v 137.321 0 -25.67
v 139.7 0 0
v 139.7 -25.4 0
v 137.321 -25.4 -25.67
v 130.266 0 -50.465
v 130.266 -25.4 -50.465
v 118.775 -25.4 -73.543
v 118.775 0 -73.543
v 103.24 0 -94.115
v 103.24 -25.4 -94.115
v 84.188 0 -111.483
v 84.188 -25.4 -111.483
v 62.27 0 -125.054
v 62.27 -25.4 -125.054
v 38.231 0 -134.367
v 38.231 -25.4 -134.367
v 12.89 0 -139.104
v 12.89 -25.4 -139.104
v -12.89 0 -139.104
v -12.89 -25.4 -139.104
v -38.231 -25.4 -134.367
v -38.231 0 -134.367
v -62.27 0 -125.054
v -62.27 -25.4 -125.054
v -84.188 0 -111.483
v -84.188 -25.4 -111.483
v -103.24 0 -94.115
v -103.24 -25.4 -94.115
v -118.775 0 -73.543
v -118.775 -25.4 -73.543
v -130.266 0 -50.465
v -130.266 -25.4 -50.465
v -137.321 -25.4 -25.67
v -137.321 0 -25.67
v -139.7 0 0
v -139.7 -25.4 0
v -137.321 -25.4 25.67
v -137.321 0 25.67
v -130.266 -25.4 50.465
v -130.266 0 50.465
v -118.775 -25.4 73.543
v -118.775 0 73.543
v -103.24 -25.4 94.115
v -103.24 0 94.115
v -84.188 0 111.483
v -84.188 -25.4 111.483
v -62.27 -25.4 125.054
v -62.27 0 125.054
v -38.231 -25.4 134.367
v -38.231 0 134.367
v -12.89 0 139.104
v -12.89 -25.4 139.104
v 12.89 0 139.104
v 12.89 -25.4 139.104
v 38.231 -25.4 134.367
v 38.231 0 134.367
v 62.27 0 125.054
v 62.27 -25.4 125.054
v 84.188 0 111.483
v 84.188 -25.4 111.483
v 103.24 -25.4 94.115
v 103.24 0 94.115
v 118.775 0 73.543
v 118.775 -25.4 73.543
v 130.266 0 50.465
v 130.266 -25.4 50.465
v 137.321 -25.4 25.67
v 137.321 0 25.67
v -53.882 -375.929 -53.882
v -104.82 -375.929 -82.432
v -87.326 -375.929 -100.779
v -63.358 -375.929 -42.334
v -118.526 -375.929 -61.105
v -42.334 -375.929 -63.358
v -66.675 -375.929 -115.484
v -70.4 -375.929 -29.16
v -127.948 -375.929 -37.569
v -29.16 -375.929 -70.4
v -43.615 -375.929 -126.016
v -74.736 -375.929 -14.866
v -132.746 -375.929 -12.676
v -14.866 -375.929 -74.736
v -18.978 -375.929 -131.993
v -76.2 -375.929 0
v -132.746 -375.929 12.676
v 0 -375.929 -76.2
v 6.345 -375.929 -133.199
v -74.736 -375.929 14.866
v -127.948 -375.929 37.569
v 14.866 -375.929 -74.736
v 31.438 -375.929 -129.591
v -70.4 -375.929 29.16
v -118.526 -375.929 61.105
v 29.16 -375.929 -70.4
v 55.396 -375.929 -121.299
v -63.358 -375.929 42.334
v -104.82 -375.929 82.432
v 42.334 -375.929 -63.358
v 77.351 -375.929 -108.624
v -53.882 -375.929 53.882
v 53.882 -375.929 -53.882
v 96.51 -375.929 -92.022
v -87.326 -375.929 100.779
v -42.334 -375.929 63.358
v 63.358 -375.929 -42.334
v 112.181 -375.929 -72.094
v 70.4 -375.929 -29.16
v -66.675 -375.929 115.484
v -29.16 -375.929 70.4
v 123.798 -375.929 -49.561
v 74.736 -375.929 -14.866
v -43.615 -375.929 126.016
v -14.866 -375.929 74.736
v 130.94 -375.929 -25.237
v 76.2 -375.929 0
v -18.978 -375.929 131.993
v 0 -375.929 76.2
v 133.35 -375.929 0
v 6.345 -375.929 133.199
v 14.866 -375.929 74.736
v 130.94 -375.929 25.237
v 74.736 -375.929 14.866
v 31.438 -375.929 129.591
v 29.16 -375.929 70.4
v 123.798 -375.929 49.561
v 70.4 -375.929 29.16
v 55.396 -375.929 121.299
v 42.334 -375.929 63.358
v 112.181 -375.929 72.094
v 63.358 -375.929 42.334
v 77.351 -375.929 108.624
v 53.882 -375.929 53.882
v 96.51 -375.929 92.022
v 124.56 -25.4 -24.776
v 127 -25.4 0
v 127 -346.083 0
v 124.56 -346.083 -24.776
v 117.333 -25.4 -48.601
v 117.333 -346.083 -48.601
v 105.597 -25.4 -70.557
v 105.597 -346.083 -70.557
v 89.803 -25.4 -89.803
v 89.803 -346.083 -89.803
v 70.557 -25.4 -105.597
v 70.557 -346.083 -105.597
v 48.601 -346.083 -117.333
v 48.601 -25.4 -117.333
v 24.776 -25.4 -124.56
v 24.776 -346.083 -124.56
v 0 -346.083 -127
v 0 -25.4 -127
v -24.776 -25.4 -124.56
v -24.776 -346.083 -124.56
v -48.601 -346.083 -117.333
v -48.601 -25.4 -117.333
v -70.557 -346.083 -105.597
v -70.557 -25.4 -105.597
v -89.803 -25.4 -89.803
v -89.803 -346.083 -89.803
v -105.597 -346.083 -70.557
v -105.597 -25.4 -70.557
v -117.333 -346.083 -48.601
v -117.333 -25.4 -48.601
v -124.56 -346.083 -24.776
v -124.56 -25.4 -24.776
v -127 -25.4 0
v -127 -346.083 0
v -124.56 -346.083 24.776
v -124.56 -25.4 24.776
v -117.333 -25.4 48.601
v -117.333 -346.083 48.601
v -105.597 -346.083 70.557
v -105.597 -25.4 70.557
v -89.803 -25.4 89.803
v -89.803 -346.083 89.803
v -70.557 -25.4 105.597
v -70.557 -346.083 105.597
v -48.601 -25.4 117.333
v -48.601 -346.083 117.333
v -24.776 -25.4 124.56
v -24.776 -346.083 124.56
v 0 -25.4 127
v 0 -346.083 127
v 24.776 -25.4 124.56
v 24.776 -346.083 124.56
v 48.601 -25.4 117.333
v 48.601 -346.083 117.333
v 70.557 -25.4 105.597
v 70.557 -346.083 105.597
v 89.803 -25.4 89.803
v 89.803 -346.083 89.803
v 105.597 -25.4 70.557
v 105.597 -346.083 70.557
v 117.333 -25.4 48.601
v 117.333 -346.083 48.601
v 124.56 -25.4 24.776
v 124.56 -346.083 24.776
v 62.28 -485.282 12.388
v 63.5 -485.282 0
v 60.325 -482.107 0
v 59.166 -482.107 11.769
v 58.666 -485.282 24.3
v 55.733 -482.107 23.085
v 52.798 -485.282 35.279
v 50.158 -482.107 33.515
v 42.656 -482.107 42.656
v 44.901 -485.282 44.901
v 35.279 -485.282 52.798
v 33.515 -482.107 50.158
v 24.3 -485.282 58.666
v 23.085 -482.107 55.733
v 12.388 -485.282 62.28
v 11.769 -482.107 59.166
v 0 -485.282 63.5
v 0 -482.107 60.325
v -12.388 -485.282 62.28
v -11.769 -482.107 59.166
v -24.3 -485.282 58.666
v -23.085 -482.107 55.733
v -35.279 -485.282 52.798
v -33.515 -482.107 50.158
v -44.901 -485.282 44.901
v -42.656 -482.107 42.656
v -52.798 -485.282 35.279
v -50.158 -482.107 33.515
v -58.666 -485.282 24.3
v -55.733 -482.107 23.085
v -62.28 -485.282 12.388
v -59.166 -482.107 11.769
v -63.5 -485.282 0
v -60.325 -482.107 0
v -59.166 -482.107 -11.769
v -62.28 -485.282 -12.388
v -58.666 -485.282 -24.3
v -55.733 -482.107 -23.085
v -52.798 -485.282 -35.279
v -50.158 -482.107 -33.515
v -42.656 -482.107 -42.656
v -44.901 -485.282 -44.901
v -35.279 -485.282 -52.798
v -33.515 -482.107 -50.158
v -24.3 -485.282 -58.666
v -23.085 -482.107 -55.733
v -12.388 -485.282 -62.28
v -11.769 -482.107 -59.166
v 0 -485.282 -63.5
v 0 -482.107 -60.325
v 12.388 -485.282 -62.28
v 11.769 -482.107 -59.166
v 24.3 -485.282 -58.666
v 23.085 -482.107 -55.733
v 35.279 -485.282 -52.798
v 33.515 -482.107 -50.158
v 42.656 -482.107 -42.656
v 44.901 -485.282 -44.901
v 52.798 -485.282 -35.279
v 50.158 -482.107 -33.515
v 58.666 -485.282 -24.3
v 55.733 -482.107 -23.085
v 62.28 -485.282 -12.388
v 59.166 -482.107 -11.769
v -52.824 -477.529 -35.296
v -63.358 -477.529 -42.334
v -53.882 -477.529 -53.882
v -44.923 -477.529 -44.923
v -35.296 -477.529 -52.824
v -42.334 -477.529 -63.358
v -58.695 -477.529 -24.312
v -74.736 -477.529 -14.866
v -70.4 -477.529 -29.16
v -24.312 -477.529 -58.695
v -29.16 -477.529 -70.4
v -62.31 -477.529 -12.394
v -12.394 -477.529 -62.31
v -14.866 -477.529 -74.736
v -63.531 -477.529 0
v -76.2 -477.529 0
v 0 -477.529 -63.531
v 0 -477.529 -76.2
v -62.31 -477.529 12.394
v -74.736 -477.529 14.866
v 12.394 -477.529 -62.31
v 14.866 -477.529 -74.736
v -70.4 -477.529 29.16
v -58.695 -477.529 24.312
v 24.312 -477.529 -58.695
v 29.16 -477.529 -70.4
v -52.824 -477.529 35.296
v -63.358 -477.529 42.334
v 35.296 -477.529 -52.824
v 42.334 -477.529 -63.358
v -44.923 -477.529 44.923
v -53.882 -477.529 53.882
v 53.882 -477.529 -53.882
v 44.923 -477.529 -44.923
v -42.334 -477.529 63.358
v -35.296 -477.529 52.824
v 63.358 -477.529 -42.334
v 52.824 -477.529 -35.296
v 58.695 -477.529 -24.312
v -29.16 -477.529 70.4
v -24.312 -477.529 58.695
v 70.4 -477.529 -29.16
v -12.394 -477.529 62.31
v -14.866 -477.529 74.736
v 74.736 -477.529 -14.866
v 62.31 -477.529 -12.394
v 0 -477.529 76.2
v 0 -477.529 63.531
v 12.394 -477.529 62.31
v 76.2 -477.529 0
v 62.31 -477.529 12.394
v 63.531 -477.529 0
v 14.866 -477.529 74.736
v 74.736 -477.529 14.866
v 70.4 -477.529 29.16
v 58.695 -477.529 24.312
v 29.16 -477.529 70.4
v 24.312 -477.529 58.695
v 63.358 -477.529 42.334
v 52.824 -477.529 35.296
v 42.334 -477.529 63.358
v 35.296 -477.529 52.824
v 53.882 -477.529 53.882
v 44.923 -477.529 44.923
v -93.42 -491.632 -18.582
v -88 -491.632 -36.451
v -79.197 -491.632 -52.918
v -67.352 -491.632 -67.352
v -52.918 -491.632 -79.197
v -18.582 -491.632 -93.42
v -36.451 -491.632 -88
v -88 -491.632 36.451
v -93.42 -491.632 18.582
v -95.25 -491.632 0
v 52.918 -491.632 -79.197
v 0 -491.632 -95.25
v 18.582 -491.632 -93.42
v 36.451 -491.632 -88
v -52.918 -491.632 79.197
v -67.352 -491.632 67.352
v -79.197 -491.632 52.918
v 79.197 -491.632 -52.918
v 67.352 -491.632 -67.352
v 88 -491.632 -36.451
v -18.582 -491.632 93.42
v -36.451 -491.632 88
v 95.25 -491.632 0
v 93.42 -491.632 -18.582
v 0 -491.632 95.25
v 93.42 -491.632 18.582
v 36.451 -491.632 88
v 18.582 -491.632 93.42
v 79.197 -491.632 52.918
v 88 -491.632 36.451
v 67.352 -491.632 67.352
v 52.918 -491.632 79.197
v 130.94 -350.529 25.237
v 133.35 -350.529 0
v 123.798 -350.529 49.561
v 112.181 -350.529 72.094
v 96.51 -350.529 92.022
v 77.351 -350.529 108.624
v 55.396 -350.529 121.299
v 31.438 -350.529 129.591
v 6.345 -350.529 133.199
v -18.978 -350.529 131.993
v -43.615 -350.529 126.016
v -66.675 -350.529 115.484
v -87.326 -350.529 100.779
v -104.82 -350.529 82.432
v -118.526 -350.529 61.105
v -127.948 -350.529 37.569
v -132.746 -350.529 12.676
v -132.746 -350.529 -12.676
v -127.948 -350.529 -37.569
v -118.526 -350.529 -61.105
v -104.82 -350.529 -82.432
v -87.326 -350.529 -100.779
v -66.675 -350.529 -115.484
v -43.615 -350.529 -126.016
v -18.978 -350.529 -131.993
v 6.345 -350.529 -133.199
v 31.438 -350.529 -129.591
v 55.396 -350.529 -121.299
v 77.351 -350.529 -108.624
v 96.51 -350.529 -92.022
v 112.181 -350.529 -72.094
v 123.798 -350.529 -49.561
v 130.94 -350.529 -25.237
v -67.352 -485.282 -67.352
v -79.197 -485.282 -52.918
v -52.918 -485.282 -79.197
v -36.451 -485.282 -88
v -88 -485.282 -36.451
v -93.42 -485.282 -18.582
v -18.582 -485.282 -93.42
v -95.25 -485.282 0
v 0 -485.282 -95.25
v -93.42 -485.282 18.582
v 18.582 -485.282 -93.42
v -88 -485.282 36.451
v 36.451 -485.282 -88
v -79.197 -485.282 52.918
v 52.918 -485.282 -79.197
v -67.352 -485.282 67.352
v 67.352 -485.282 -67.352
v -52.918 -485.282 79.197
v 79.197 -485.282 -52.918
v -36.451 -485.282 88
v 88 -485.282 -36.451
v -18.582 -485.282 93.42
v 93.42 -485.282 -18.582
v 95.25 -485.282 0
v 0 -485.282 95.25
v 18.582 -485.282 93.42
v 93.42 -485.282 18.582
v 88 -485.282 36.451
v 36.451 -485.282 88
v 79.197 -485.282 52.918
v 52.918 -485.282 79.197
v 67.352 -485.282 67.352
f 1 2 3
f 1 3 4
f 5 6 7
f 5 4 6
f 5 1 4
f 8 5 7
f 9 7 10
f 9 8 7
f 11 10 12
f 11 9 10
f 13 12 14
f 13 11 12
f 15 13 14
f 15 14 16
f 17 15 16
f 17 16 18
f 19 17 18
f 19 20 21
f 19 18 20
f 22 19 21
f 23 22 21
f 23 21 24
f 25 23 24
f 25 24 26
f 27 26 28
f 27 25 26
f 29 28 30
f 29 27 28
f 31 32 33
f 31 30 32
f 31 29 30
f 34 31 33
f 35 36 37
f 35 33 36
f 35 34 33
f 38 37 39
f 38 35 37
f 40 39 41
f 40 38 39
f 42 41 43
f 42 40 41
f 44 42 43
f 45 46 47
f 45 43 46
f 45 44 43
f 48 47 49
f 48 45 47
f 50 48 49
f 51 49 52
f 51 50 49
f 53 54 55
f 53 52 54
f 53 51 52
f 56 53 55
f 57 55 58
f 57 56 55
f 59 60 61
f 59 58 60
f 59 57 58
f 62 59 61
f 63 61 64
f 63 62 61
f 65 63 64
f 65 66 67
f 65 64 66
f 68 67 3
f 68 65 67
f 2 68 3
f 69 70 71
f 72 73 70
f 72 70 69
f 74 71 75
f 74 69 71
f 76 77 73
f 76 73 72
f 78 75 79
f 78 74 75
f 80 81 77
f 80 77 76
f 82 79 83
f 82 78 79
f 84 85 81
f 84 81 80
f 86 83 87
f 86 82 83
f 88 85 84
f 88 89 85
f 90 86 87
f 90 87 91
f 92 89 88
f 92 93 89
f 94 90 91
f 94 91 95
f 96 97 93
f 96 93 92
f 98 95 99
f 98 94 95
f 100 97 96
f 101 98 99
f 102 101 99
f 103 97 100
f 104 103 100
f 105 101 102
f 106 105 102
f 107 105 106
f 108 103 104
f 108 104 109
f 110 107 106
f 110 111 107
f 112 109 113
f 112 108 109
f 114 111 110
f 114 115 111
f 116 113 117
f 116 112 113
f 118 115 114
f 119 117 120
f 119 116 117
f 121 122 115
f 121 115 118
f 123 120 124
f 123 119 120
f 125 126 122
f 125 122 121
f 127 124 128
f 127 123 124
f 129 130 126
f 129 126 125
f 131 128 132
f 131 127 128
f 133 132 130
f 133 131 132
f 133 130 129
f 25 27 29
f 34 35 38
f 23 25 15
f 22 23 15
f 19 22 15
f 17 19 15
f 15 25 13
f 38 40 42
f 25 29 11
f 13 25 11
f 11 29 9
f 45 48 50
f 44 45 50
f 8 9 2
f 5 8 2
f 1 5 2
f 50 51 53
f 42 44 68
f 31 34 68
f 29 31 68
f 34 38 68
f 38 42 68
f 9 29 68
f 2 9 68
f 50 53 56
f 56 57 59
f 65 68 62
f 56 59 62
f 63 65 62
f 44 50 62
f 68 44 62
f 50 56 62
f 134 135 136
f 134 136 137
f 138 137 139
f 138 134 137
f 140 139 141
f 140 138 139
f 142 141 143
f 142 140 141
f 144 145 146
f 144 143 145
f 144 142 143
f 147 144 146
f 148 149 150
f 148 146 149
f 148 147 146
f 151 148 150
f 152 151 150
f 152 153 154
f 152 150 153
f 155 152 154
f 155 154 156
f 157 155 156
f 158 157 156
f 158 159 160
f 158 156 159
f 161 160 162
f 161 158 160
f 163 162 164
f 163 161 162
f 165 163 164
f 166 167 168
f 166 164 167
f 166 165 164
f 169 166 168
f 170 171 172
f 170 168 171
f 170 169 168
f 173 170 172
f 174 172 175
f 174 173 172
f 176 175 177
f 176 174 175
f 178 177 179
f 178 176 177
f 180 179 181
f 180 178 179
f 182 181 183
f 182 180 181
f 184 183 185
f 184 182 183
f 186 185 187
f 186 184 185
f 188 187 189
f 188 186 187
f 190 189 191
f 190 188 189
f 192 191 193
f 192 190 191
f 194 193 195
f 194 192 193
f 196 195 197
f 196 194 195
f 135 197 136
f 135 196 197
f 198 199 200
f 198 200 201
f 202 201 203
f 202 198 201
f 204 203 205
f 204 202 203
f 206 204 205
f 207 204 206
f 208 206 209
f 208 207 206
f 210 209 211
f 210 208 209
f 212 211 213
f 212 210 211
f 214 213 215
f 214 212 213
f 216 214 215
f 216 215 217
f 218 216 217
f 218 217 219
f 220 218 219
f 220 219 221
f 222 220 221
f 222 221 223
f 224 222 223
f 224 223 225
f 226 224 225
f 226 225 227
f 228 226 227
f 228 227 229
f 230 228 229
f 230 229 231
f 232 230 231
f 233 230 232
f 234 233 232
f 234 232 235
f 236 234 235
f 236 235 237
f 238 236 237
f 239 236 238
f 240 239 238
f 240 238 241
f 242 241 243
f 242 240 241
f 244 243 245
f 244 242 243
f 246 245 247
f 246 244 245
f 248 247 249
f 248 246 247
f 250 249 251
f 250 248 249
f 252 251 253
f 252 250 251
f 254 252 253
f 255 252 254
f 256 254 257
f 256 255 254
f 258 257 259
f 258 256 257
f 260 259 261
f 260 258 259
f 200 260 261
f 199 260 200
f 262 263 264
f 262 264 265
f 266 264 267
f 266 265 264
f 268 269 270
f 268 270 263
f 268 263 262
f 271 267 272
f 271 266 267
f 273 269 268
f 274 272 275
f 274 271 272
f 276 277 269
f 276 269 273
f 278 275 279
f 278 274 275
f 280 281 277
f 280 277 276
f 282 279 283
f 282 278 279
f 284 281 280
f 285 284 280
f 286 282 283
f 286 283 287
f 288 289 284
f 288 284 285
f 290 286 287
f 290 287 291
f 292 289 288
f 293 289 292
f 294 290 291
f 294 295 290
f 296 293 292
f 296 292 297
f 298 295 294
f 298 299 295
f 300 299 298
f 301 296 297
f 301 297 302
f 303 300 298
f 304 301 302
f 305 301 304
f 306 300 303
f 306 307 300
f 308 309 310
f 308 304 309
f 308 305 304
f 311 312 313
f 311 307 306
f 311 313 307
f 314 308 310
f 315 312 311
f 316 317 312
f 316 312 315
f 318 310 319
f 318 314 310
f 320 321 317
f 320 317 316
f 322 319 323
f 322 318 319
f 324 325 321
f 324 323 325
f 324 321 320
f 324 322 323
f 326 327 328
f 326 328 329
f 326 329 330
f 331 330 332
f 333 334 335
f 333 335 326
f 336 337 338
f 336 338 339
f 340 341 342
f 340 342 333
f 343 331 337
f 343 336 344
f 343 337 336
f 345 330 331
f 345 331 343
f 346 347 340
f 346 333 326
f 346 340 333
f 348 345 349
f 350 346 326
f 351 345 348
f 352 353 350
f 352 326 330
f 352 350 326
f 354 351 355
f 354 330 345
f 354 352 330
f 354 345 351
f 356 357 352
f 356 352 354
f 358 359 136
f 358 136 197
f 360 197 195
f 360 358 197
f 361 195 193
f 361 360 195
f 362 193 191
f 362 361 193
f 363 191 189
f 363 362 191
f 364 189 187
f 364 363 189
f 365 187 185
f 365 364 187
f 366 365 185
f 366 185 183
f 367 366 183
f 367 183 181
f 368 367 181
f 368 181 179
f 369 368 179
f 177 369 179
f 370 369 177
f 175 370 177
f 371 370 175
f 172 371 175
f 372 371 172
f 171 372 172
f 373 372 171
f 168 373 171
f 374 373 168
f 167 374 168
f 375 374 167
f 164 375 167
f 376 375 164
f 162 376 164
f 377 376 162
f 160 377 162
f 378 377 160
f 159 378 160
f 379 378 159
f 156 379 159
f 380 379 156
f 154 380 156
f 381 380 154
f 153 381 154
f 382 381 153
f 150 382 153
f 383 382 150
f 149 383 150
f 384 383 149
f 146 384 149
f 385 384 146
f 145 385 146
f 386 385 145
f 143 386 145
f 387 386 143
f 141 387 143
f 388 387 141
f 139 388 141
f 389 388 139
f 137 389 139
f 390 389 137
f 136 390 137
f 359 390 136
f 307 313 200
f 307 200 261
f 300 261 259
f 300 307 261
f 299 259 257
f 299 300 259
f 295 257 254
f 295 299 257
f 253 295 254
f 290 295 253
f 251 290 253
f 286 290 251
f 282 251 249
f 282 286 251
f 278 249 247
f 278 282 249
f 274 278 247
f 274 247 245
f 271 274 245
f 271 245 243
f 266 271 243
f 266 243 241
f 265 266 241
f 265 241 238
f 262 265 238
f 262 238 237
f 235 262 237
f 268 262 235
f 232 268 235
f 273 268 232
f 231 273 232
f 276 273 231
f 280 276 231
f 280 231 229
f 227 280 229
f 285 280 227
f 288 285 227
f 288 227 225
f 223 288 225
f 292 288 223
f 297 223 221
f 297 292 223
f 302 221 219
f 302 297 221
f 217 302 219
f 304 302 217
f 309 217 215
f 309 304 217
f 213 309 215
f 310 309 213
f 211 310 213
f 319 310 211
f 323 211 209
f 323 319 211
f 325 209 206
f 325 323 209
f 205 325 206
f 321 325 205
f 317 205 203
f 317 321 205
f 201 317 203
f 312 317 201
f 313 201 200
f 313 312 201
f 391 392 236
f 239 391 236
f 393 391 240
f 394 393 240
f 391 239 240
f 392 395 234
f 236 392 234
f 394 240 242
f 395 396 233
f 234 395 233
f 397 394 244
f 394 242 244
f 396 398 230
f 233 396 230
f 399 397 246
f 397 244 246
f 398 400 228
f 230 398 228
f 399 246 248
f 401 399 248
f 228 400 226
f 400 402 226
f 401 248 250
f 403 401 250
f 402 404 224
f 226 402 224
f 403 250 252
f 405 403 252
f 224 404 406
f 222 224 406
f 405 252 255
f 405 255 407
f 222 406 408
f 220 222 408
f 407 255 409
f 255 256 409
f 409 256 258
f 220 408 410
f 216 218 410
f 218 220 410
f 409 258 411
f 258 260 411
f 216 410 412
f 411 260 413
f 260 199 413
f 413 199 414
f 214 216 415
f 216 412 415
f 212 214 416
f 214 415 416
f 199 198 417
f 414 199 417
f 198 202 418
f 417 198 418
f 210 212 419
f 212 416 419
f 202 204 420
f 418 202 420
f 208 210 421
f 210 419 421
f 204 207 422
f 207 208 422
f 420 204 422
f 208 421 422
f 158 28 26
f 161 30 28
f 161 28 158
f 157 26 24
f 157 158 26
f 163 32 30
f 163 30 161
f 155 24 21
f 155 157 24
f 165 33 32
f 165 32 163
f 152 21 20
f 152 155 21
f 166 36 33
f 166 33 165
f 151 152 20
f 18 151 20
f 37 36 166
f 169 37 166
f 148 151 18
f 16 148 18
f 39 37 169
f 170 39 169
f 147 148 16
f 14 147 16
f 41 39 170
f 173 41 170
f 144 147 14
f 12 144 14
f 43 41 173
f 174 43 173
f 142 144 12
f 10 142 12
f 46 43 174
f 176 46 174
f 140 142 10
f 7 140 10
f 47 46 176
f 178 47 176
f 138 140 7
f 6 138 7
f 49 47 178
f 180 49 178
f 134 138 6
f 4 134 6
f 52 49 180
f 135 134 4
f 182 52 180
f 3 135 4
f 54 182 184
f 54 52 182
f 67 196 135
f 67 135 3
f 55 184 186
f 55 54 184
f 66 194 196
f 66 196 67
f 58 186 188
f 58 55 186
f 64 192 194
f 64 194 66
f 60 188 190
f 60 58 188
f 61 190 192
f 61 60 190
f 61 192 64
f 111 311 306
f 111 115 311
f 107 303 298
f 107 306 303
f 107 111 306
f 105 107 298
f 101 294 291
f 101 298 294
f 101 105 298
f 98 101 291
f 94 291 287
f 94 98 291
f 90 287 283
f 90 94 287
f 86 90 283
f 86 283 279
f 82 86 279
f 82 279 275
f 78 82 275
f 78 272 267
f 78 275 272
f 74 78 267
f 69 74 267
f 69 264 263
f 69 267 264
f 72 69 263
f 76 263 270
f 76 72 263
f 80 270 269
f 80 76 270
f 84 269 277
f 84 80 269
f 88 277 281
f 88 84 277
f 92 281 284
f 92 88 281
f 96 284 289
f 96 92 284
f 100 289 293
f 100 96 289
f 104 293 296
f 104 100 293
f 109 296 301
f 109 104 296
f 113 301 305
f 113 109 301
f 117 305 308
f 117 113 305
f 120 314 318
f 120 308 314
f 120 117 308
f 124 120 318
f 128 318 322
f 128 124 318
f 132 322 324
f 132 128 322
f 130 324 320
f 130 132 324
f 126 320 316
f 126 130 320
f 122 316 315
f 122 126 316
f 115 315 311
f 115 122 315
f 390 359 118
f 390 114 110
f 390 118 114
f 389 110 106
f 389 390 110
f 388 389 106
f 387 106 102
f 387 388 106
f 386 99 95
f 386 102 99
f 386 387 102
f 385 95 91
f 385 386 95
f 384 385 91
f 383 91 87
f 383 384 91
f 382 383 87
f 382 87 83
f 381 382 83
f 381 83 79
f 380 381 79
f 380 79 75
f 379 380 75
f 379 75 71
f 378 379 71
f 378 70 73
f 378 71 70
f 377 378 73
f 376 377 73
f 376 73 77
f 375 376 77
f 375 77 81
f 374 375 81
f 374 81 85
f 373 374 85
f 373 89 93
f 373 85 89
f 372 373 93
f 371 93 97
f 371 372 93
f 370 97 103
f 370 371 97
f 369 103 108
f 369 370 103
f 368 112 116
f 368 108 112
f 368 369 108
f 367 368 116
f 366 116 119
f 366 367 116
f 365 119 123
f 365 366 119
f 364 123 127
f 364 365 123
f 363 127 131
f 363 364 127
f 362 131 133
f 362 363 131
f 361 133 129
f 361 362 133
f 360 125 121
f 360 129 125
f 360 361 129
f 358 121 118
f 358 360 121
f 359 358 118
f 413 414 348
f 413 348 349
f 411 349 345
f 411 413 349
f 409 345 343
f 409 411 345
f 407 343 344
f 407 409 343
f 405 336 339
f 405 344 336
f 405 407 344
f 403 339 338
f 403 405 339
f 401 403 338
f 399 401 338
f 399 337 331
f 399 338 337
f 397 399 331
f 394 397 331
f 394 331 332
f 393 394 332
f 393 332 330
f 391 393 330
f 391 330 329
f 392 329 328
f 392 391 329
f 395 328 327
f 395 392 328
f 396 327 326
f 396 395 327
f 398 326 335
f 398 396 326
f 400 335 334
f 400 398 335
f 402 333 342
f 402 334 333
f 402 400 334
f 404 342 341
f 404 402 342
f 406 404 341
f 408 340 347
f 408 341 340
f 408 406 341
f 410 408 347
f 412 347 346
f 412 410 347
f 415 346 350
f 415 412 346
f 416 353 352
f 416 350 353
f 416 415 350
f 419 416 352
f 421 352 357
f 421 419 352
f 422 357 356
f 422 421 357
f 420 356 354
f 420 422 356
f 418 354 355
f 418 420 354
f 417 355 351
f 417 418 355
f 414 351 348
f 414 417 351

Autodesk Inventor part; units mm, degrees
ref_plane "YZ Plane" through (0, 0, 0) normal (1, 0, 0) x (0, 1, 0)
ref_plane "XZ Plane" through (0, 0, 0) normal (0, 1, 0) x (-1, 0, 0)
ref_plane "XY Plane" through (0, 0, 0) normal (0, 0, 1) x (1, 0, 0)
sketch "Sketch1" plane through (0, 0, 0) normal (0, 0, 1) x (-1, 0, 0)
  line L0 (0, -67.1677) -> (0, 491.6323)
  line L1 (0, 491.6323) -> (-95.25, 491.6323)
  line L2 (-95.25, 491.6323) -> (-95.25, 485.2823)
  line L3 (-95.25, 485.2823) -> (-63.5, 485.2823)
  line L4 (-63.5, 485.2823) -> (-60.325, 482.1073)
  line L5 (-60.325, 482.1073) -> (-63.5308, 477.5289)
  line L6 (-63.5308, 477.5289) -> (-76.2, 477.5289)
  line L7 (-76.2, 477.5289) -> (-76.2, 375.9289)
  line L8 (-76.2, 375.9289) -> (-133.35, 375.9289)
  line L9 (-133.35, 375.9289) -> (-133.35, 350.5289)
  line L10 (-133.35, 350.5289) -> (-127, 346.0826)
  line L11 (-127, 346.0826) -> (-127, 25.4)
  line L12 (-127, 25.4) -> (-139.7, 25.4)
  line L13 (-139.7, 25.4) -> (-139.7, 0)
  line L14 (-139.7, 0) -> (0, 0)
  line L15 (0, 0) -> (0, 491.6323)
  dimension "d1" = 127
  dimension "d2" = 25.4
  dimension "d3" = 12.7
  dimension "d4" = 95.25
  dimension "d5" = 6.35
  dimension "d6" = 558.8
  dimension "d7" = 6.35
  dimension "d9" = 63.5
  dimension "d10" = 76.2
  dimension "d11" = 101.6
  dimension "d12" = 35
  dimension "d13" = 135
  dimension "d14" = 25.4
  dimension "d15" = 3.175
revolve "Revolution1" add sketch "Sketch1" angle 360 about axis through (0, 67.1677, 0) along (0, -1, 0)
properties part number "Newport SL 1200-422"
